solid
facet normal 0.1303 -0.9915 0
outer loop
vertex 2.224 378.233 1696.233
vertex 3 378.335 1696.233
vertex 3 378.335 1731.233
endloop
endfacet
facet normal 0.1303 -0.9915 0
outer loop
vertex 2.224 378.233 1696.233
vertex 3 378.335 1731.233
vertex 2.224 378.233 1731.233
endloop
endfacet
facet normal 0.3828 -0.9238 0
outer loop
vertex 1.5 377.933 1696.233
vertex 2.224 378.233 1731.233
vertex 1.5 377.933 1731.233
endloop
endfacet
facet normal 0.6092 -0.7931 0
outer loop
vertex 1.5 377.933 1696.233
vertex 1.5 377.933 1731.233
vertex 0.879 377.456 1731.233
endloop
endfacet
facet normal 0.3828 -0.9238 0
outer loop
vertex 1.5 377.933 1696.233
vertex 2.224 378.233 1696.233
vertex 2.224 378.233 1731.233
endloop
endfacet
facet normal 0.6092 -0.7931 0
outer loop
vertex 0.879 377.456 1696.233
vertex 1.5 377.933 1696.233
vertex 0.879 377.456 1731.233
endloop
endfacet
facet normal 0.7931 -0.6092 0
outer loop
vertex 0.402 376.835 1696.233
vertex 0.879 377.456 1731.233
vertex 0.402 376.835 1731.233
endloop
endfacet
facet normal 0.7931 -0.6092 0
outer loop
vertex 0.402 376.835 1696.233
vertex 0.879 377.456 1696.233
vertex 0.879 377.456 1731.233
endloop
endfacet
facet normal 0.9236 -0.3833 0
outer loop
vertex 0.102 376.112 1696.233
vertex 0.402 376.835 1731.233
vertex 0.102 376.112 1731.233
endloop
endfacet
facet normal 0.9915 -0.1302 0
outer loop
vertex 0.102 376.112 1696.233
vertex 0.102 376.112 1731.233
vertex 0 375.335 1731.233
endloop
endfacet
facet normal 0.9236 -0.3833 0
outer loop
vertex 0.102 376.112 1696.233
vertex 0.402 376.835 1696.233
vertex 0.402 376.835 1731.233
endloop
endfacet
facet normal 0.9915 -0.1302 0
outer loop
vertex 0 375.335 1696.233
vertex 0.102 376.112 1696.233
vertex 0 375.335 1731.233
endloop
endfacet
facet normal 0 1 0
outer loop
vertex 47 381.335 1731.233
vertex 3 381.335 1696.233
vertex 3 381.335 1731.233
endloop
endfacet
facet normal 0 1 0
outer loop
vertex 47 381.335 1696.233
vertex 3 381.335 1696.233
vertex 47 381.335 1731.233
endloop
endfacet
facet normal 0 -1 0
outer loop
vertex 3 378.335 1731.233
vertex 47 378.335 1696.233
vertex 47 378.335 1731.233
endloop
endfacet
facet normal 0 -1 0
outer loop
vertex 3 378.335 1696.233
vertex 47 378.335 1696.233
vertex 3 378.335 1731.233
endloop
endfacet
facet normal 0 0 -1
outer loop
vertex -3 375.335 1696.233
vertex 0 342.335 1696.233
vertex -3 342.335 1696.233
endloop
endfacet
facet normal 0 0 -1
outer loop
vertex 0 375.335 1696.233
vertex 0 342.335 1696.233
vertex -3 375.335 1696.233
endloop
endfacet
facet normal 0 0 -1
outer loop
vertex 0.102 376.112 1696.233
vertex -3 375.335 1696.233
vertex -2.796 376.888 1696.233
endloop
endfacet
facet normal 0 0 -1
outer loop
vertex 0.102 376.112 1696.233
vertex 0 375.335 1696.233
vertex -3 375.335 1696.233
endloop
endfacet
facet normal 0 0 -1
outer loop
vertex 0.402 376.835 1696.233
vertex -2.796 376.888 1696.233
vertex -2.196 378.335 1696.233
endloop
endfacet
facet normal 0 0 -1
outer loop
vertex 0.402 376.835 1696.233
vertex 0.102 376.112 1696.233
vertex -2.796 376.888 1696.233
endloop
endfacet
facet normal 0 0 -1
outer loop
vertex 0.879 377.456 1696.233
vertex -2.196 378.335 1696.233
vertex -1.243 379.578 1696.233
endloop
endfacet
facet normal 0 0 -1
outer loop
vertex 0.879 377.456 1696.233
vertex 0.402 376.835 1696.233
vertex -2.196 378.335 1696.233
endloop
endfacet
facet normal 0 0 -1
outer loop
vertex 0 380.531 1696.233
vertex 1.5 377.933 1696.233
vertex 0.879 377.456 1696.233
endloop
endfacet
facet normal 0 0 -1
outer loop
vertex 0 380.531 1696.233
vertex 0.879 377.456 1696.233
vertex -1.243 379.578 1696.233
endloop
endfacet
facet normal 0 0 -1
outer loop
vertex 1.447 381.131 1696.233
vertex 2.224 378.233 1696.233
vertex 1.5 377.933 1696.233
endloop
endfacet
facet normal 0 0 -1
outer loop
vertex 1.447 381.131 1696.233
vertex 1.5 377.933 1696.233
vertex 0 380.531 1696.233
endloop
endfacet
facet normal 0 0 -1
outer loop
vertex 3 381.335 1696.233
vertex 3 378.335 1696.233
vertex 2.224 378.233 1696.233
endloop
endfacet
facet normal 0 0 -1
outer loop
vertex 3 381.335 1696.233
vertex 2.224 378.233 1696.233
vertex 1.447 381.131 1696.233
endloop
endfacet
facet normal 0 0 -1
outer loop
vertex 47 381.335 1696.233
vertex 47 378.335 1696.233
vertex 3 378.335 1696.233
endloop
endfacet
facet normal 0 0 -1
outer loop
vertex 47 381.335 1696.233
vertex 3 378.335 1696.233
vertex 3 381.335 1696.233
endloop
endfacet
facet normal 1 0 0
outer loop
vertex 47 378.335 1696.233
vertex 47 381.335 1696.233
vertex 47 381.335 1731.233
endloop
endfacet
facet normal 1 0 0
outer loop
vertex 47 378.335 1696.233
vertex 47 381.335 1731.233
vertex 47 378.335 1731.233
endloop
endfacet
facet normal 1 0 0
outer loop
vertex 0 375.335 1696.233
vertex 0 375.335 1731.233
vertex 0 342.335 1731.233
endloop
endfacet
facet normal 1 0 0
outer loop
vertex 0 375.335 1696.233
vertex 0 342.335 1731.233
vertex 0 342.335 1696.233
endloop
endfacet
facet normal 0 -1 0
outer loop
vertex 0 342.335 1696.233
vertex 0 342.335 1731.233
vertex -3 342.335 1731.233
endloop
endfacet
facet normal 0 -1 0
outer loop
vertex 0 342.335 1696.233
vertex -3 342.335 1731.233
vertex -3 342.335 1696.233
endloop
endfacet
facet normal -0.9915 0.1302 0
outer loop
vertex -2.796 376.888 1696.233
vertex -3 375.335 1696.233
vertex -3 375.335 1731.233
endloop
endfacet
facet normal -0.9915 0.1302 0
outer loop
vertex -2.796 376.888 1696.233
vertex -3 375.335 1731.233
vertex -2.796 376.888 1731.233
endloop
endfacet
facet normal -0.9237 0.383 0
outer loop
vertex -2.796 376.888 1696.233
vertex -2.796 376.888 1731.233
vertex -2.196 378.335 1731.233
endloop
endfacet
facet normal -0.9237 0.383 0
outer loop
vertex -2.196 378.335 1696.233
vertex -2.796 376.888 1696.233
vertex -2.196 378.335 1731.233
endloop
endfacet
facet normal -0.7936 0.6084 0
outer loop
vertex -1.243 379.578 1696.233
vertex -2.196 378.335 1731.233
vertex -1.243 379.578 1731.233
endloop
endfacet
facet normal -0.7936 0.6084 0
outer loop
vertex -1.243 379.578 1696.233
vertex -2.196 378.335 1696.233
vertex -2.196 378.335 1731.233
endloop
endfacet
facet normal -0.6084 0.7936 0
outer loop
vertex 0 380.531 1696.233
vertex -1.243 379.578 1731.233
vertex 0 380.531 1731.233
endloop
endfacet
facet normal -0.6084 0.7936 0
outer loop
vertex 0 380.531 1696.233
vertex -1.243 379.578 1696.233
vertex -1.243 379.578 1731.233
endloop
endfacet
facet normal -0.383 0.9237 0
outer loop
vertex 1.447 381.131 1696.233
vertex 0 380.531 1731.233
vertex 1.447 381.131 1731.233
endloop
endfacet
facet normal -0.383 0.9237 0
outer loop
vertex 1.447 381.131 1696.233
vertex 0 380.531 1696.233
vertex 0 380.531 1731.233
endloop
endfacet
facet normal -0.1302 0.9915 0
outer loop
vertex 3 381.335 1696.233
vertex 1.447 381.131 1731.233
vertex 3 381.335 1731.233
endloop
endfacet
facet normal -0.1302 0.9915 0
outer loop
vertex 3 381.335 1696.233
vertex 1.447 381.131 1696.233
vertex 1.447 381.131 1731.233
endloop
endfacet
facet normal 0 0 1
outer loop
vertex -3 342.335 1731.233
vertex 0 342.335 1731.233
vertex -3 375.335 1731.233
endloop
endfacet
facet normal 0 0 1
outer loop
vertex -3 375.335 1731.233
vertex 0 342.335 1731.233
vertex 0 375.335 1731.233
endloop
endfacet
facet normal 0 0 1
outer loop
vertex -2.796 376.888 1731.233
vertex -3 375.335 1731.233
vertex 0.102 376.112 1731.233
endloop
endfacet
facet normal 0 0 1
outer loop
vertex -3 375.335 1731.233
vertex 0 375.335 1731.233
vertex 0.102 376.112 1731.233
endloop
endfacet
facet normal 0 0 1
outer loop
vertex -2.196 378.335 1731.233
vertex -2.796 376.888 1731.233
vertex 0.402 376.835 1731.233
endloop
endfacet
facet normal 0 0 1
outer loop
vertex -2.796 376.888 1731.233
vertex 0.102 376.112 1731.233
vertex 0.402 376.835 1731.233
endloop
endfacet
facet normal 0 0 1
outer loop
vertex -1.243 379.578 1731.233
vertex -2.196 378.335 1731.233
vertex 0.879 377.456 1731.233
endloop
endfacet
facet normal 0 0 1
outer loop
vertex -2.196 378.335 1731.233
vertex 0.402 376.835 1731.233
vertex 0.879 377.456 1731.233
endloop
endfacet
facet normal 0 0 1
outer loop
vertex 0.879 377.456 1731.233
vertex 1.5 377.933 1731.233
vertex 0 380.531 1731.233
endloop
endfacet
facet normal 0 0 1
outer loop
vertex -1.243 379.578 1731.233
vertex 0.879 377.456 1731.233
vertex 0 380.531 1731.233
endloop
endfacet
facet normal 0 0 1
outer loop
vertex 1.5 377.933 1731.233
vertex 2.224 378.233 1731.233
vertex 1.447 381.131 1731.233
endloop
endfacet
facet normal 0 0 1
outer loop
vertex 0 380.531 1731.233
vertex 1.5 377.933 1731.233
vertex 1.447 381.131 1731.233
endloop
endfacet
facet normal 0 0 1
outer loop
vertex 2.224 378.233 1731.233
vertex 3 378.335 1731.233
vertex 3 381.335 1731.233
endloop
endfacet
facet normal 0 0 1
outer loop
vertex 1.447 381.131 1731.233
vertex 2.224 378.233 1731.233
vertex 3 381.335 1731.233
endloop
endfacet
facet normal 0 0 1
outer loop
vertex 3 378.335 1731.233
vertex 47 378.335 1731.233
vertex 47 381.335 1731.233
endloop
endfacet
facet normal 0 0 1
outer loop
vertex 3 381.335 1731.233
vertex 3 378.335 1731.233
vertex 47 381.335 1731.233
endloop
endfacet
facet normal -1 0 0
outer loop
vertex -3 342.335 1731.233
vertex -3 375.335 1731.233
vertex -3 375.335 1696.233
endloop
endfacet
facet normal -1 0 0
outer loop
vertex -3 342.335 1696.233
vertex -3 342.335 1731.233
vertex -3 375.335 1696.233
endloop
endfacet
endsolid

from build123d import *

# Parameters (mm, degrees)
SKETCH1_W          = 35
SKETCH1_H          = 33
BASE_FLANGE1_DEPTH = 3
EDGE_FLANGE1_DEPTH = 35


# Sheet-metal steps are written as plain solids
with BuildPart() as part:
    # Sketch1 → Base-Flange1 (new body)
    with BuildSketch(Plane(origin=(0, 0, 0), x_dir=(0, 0, -1), z_dir=(1, 0, 0))):
        with Locations((-1713.733243968, 358.835120643)):
            Rectangle(SKETCH1_W, SKETCH1_H)
    extrude(amount=-BASE_FLANGE1_DEPTH)

    # Edge-Flange1 section (across the edge) → Edge-Flange1 (add)
    with BuildSketch(Plane(origin=(0, 378.335120643, 1696.233243968), x_dir=(0, -1, 0), z_dir=(0, 0, 1))):
        with BuildLine():
            Line((-3, 3), (-3, 47))
            Line((-3, 47), (0, 47))
            Line((0, 47), (0, 3))
            ThreePointArc((0, 3), (0.878679656, 0.878679656), (3, 0))
            Line((3, 0), (3, -3))
            ThreePointArc((3, -3), (-1.242640687, -1.242640687), (-3, 3))
        make_face()
    extrude(amount=EDGE_FLANGE1_DEPTH)


solid = part.part
